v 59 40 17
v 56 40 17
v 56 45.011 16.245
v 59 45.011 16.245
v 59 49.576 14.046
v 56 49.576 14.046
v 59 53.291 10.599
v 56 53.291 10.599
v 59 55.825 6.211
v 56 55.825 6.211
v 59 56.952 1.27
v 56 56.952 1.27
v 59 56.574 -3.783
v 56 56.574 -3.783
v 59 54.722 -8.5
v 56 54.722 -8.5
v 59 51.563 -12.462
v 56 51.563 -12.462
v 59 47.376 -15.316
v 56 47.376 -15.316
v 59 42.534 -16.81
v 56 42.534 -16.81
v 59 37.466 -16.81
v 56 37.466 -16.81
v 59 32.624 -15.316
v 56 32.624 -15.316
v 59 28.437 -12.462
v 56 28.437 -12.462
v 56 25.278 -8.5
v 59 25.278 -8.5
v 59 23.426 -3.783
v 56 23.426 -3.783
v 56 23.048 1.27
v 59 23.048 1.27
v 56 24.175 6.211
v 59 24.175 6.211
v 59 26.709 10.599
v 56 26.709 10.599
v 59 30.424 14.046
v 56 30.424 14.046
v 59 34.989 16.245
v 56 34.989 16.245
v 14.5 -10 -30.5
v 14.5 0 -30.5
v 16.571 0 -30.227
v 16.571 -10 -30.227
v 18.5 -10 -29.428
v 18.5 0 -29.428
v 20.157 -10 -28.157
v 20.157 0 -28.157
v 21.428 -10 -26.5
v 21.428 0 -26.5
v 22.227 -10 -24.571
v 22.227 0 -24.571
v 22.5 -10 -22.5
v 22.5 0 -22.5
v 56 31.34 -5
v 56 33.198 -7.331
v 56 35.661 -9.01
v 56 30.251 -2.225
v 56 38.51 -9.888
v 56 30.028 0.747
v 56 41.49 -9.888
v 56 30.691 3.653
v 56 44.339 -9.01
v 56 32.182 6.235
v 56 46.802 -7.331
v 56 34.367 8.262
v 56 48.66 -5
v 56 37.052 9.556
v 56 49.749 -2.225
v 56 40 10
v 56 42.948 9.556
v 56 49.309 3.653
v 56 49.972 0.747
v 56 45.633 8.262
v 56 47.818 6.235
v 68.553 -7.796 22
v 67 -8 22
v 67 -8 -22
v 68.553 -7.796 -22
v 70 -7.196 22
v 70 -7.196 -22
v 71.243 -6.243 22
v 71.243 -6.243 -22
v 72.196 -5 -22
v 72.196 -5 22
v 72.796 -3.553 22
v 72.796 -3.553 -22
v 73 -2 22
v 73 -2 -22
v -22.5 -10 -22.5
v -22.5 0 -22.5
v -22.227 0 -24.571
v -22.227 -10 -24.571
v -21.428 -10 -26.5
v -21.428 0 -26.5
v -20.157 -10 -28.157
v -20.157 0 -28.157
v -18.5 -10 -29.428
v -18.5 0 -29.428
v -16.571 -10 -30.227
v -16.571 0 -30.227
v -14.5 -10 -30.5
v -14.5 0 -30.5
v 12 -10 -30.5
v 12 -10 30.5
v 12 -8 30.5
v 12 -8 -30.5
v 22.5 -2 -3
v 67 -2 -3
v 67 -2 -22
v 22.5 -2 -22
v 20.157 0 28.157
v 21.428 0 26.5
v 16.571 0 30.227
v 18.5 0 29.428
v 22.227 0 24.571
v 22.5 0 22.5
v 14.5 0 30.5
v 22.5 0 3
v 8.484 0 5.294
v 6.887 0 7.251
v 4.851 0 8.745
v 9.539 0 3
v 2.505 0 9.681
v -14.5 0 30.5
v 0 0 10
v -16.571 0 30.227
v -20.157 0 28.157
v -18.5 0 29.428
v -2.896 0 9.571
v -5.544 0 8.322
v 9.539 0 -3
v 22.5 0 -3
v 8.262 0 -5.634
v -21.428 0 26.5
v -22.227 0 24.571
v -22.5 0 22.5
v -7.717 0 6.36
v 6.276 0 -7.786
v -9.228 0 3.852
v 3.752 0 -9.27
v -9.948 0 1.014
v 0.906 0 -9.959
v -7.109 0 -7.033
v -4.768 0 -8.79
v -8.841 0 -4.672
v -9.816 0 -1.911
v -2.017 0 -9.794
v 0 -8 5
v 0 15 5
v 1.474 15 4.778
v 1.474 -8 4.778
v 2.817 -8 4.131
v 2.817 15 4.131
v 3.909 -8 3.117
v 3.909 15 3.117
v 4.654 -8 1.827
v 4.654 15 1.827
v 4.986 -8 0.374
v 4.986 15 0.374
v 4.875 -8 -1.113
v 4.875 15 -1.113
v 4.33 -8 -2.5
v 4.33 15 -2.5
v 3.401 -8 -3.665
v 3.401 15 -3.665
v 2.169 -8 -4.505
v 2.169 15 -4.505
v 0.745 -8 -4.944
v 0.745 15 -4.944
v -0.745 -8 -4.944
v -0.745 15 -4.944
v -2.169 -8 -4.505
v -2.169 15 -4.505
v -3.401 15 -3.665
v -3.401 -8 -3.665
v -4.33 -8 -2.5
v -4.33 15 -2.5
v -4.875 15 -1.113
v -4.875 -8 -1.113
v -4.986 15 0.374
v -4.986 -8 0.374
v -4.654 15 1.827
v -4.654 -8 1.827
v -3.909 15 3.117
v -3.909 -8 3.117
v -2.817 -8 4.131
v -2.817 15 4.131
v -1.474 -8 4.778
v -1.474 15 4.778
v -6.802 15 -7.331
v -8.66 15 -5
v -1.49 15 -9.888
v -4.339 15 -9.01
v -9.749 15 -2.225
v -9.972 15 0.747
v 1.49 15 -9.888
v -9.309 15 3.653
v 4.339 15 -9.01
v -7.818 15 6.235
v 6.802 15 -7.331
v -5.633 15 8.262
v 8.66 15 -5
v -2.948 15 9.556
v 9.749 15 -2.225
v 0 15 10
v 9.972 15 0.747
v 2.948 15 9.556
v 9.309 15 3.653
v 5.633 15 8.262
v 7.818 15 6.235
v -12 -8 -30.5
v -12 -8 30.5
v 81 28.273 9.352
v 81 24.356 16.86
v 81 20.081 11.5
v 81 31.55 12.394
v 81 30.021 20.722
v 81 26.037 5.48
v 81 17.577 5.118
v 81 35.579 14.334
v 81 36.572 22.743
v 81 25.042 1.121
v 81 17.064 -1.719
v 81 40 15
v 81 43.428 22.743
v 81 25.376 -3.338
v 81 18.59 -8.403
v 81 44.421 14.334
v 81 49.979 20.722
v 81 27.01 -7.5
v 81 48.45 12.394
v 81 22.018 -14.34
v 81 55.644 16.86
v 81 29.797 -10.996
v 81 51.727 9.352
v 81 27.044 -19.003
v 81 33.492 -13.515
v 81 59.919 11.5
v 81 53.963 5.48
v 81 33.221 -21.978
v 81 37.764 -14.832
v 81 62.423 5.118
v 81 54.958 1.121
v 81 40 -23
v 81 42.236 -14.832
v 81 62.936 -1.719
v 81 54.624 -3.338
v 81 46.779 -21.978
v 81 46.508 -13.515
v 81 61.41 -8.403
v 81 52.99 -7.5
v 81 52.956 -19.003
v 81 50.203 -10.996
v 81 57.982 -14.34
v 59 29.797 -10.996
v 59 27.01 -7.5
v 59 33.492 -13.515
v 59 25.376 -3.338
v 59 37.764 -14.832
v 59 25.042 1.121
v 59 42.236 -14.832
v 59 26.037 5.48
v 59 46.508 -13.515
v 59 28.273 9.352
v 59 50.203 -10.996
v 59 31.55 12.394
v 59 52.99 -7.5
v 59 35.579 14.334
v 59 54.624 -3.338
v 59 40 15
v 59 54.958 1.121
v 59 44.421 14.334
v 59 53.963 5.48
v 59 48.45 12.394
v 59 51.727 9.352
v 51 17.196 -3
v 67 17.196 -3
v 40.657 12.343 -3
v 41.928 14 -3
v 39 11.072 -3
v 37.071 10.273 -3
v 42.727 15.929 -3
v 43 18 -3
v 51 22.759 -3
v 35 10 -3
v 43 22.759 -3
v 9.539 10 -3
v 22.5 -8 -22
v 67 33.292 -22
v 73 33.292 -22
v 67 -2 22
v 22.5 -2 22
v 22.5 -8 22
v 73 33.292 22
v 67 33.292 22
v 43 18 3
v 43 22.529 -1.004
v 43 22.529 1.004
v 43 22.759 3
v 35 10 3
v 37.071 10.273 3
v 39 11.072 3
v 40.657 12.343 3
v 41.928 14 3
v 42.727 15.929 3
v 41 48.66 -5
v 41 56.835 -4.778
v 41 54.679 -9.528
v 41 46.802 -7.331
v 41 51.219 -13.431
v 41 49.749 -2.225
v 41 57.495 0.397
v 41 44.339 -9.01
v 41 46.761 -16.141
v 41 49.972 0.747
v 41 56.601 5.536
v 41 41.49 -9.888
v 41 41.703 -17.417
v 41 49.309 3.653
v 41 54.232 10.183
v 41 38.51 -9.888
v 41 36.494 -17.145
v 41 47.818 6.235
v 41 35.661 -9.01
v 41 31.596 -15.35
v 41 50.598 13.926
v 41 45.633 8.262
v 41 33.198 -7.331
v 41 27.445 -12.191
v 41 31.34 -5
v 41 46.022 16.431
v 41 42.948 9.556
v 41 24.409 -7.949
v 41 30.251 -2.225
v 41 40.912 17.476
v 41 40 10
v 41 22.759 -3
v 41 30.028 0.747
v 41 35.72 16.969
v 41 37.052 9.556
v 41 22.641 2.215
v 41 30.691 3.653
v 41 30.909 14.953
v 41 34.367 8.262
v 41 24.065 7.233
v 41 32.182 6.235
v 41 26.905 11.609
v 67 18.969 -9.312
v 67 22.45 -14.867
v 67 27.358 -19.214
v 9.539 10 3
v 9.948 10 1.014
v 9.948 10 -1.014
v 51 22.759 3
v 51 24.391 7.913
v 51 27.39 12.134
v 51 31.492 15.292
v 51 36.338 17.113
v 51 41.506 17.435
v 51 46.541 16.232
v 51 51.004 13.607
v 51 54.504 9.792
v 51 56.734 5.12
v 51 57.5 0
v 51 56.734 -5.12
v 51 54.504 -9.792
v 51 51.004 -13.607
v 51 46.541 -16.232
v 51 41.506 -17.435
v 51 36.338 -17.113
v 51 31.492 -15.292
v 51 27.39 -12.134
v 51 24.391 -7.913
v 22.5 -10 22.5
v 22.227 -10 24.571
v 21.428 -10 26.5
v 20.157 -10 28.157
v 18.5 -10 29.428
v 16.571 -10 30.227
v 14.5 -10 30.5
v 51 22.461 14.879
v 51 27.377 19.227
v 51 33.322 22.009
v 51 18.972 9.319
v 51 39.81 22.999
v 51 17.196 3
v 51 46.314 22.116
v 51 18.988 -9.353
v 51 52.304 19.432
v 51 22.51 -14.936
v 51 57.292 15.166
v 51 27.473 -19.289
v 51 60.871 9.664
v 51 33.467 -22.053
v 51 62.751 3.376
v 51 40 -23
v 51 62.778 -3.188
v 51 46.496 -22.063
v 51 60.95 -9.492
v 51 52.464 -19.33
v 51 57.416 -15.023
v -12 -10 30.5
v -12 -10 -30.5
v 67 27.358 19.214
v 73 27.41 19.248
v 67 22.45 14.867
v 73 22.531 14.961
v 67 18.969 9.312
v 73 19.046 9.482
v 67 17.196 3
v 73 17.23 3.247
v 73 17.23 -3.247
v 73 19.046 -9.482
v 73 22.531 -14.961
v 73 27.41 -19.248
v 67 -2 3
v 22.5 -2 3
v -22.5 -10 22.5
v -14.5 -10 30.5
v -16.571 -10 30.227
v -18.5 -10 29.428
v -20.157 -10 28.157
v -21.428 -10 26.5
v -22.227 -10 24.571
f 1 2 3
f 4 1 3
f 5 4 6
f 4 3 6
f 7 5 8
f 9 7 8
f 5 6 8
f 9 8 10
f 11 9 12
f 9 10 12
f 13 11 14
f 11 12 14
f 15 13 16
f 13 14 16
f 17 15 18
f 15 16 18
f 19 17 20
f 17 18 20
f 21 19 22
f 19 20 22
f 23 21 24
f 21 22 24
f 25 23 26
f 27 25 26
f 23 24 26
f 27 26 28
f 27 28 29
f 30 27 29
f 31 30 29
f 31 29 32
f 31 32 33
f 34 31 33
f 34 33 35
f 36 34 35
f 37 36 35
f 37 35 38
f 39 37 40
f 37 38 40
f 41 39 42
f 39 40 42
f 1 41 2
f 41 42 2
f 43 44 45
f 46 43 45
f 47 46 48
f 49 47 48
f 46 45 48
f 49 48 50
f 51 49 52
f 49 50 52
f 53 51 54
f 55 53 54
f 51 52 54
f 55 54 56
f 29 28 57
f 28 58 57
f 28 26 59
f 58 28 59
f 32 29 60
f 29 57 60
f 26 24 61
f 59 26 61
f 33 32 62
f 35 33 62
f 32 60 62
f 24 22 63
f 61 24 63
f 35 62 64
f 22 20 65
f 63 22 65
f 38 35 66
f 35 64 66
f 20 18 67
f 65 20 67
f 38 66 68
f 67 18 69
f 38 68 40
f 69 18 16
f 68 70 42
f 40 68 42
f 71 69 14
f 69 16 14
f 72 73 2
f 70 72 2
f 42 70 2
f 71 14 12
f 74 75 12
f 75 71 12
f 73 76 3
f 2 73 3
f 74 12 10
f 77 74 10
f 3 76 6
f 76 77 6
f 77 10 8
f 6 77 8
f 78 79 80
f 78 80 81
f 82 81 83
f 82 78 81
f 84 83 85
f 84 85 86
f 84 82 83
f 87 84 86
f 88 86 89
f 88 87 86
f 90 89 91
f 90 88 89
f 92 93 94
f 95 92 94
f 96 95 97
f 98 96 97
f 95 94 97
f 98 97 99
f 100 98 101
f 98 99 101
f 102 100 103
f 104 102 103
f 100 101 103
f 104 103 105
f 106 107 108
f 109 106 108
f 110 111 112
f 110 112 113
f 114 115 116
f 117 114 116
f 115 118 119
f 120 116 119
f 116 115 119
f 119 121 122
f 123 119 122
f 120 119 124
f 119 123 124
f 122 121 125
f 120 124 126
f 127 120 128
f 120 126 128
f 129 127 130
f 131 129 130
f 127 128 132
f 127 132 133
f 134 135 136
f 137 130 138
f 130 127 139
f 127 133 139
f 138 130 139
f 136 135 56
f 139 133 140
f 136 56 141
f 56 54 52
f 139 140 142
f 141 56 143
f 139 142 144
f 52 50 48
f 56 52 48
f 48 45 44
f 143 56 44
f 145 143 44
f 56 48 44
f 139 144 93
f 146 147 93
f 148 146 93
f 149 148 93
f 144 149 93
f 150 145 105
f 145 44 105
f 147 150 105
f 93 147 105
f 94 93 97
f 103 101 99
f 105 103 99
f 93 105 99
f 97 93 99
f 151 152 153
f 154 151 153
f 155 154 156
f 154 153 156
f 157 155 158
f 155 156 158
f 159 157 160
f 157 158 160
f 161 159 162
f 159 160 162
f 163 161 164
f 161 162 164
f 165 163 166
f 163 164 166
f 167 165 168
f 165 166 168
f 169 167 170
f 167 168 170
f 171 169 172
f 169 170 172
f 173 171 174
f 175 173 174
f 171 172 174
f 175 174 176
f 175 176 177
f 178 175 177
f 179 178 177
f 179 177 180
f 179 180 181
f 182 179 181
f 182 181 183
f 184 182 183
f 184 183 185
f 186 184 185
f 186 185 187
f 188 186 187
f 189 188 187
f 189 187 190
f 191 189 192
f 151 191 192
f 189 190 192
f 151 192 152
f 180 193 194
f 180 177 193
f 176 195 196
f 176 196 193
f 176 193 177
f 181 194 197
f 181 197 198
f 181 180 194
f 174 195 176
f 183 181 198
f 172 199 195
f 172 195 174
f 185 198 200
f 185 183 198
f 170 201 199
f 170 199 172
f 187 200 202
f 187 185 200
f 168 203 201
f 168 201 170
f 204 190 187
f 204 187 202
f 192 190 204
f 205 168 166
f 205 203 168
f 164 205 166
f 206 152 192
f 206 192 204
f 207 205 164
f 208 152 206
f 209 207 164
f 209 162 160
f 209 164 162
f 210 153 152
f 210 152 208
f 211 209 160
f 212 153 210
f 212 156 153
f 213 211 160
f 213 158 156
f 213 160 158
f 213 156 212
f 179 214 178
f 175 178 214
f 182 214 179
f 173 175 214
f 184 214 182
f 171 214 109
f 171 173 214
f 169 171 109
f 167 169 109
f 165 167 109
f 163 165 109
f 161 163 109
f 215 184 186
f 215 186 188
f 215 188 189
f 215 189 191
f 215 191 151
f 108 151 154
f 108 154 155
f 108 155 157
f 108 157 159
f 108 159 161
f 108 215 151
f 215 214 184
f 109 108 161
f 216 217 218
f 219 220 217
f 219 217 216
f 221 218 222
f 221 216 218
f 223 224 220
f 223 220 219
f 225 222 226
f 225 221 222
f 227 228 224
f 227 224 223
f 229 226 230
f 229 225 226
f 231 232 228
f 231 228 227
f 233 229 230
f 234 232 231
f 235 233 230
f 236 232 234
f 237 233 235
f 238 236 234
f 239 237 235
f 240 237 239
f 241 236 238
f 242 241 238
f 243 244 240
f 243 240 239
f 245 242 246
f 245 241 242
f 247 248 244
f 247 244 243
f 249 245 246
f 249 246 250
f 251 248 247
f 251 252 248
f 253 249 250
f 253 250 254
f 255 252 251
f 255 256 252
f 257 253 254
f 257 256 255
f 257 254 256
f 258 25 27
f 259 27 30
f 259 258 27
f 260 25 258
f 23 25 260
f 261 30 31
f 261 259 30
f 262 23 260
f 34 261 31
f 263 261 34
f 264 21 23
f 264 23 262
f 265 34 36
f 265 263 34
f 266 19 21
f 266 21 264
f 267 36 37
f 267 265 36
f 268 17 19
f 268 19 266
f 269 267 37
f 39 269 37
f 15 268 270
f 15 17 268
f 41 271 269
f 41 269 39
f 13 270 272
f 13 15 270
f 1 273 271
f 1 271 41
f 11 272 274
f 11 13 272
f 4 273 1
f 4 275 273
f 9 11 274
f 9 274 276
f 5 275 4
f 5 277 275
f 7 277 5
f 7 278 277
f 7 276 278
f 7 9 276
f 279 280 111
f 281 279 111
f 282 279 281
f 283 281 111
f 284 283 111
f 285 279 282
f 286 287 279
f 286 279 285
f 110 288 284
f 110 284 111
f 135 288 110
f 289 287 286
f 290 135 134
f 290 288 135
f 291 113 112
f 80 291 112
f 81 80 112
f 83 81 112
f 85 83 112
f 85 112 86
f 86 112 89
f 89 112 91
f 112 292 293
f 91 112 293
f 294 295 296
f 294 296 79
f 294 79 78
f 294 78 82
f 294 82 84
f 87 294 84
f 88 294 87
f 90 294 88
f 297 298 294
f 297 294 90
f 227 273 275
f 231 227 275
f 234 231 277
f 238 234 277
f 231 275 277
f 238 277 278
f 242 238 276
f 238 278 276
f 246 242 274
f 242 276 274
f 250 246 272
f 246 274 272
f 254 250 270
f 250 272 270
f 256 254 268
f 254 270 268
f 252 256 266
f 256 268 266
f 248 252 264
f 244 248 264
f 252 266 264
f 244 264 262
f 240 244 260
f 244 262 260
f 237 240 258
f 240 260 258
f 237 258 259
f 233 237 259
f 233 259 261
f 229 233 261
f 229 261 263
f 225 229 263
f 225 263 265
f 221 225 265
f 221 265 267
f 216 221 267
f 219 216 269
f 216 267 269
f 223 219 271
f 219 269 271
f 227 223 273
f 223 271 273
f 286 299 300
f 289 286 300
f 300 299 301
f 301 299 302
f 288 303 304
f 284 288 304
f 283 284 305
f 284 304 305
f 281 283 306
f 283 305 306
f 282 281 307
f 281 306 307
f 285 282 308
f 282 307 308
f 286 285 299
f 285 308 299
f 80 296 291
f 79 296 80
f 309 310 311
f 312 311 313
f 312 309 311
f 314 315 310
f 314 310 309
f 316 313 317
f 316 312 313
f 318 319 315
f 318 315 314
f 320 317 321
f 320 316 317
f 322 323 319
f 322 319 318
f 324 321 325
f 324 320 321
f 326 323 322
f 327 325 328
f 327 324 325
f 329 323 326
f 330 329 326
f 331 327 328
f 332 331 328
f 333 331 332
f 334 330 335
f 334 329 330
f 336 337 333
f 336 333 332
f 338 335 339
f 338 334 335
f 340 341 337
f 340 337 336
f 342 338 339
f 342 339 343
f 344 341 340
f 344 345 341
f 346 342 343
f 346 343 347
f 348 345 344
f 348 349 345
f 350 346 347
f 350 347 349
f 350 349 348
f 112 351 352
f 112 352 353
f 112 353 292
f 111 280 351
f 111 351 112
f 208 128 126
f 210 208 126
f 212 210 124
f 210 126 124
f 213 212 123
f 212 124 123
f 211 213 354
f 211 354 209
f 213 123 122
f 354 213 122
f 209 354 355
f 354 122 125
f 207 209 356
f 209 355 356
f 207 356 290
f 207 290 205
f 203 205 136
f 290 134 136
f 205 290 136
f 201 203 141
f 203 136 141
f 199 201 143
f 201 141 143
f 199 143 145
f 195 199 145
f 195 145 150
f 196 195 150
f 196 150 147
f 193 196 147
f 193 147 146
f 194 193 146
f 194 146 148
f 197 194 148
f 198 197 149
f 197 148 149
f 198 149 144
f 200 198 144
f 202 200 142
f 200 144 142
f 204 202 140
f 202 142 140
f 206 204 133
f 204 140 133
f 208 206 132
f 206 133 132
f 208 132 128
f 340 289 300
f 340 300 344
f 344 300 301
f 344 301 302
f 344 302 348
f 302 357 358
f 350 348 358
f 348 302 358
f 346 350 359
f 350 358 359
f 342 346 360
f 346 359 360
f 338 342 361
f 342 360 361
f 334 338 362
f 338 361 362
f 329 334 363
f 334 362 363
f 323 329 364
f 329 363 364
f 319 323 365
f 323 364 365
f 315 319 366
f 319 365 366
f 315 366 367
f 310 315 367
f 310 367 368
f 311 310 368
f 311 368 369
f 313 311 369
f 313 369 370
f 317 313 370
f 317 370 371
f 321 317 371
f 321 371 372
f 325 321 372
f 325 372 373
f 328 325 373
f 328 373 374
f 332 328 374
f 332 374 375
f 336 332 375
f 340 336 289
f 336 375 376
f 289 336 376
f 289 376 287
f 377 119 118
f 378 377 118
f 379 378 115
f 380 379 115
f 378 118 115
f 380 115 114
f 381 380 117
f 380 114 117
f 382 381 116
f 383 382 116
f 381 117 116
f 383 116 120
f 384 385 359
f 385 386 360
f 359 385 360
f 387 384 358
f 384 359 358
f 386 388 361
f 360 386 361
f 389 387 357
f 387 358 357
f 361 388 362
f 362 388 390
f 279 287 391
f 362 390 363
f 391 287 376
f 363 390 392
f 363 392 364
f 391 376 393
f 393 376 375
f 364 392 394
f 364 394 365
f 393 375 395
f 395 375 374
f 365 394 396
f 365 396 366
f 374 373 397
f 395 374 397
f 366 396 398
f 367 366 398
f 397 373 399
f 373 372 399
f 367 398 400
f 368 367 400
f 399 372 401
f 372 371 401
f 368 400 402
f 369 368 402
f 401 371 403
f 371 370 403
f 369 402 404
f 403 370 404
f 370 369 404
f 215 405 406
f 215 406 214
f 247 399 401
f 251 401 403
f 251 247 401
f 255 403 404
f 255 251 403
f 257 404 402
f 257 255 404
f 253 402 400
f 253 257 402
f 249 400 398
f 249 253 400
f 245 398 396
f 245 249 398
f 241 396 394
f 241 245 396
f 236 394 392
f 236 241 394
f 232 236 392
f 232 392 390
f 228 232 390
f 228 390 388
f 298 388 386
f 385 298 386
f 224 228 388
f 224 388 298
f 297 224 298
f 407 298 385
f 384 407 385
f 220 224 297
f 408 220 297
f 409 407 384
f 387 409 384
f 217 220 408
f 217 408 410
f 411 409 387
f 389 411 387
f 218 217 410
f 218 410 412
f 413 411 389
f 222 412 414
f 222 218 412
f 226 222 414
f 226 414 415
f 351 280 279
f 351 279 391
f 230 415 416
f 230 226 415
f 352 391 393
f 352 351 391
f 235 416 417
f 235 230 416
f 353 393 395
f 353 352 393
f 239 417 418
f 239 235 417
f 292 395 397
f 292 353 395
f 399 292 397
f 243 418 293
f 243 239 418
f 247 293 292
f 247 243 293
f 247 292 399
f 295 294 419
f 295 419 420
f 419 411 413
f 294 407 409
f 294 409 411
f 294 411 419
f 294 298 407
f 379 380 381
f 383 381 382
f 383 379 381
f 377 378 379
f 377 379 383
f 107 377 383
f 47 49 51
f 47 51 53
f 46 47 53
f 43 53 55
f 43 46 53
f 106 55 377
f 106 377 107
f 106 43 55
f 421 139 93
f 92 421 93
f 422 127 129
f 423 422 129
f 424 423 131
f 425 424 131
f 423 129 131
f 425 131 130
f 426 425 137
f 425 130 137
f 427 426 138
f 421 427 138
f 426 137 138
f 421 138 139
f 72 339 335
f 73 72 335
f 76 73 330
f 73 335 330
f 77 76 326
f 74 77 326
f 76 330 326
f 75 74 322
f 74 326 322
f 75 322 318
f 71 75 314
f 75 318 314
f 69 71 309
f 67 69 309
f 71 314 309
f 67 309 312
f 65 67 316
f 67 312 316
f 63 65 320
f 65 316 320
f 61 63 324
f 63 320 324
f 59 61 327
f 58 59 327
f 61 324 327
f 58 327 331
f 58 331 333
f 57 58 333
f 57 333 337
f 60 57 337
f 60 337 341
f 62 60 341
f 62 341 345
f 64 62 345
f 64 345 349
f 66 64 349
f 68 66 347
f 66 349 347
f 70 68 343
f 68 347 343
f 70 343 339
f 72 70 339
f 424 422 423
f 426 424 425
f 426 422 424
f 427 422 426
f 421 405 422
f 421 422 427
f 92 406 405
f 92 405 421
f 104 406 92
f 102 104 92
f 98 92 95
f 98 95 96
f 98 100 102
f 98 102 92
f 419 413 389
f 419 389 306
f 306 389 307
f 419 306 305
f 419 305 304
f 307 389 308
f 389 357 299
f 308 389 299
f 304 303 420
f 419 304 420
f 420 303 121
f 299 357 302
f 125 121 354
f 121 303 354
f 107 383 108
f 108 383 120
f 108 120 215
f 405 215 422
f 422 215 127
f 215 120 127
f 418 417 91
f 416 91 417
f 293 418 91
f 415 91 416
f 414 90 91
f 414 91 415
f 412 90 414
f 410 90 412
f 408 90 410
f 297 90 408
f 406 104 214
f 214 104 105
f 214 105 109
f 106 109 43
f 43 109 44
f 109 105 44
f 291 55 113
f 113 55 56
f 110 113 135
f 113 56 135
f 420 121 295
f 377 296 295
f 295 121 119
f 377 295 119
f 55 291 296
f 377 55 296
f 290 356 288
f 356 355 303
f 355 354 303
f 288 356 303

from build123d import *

# Parameters (mm, degrees)
EXTRUDE_1_DEPTH     = 10
SKETCH_2_R          = 10
EXTRUDE_2_DEPTH     = 15
SKETCH_3_W          = 24
SKETCH_3_H          = 4
CUT_EXTRUDE_1_DEPTH = 61
SKETCH_4_R          = 5
CUT_EXTRUDE_2_DEPTH = 23
EXTRUDE_3_DEPTH     = 22
EXTRUDE_4_DEPTH     = 3
EXTRUDE_START       = 8
SKETCH_7_R          = 23
EXTRUDE_5_DEPTH     = 30
SKETCH_9_R          = 17.5
EXTRUDE_6_DEPTH     = 10
SKETCH_10_R         = 10
CUT_EXTRUDE_3_DEPTH = 15
SKETCH_12_R         = 17
CUT_EXTRUDE_4_DEPTH = 3
SKETCH_13_R         = 15
CUT_EXTRUDE_5_DEPTH = 22


with BuildPart() as part:
    # 草图1 → 凸台-拉伸1 (new body)
    with BuildSketch(Plane(origin=(0, 0, 0), x_dir=(1, 0, 0), z_dir=(0, 1, 0))):
        with BuildLine():
            Line((-14.5, 30.5), (14.5, 30.5))
            ThreePointArc((14.5, 30.5), (20.156854249, 28.156854249), (22.5, 22.5))
            Line((22.5, 22.5), (22.5, -22.5))
            ThreePointArc((22.5, -22.5), (20.156854249, -28.156854249), (14.5, -30.5))
            Line((14.5, -30.5), (-14.5, -30.5))
            ThreePointArc((-14.5, -30.5), (-20.156854249, -28.156854249), (-22.5, -22.5))
            Line((-22.5, -22.5), (-22.5, 22.5))
            ThreePointArc((-22.5, 22.5), (-20.156854249, 28.156854249), (-14.5, 30.5))
        make_face()
    extrude(amount=-EXTRUDE_1_DEPTH)

    # 草图2 → 凸台-拉伸2 (add)
    with BuildSketch(Plane(origin=(0, 0, 0), x_dir=(1, 0, 0), z_dir=(0, 1, 0))):
        with Locations(Location((0, 0, 0), (0, 0, 270))):
            Circle(SKETCH_2_R)
    extrude(amount=EXTRUDE_2_DEPTH)

    # 草图3 → 切除-拉伸1 (cut)
    with BuildSketch(Plane.XY.offset(30.5)):
        with Locations((0, -10)):
            Rectangle(SKETCH_3_W, SKETCH_3_H)
    extrude(amount=-CUT_EXTRUDE_1_DEPTH, mode=Mode.SUBTRACT)

    # 草图4 → 切除-拉伸2 (cut)
    with BuildSketch(Plane(origin=(0, 15, 0), x_dir=(1, 0, 0), z_dir=(0, 1, 0))):
        with Locations(Location((0, 0, 0), (0, 0, 270))):
            Circle(SKETCH_4_R)
    extrude(amount=-CUT_EXTRUDE_2_DEPTH, mode=Mode.SUBTRACT)

    # 草图6 → 凸台-拉伸3 (add, symmetric)
    with BuildSketch(Plane.XY):
        with BuildLine():
            Line((22.5, -8), (67, -8))
            ThreePointArc((67, -8), (71.242640687, -6.242640687), (73, -2))
            Line((73, -2), (73, 40))
            Line((73, 40), (67, 40))
            Line((67, 40), (67, -2))
            Line((67, -2), (22.5, -2))
            Line((22.5, -2), (22.5, -8))
        make_face()
    extrude(amount=EXTRUDE_3_DEPTH, both=True)

    # 草图6<3> → 凸台-拉伸4 (add, symmetric)
    with BuildSketch(Plane.XY):
        with BuildLine():
            ThreePointArc((35, 10), (40.656854249, 12.343145751), (43, 18))
            Line((43, 18), (43, 40))
            Line((43, 40), (67, 40))
            Line((67, 40), (67, -2))
            Line((67, -2), (22.5, -2))
            Line((22.5, -2), (6.5, -2))
            Line((6.5, -2), (6.5, 10))
            Line((6.5, 10), (35, 10))
        make_face()
    extrude(amount=EXTRUDE_4_DEPTH, both=True)

    # 草图7 → 凸台-拉伸5 (add)
    with BuildSketch(Plane(origin=(73, 0, 0), x_dir=(0, 0, -1), z_dir=(1, 0, 0)).offset(EXTRUDE_START)):
        with Locations((0, 40)):
            Circle(SKETCH_7_R)
    extrude(amount=-EXTRUDE_5_DEPTH)

    # 草图9 → 凸台-拉伸6 (add)
    with BuildSketch(Plane.ZY.offset(-51)):
        with Locations(Location((0, 40, 0), (0, 0, 260.129110394))):
            Circle(SKETCH_9_R)
    extrude(amount=EXTRUDE_6_DEPTH)

    # 草图10 → 切除-拉伸3 (cut)
    with BuildSketch(Plane.ZY.offset(-41)):
        with Locations((0, 40)):
            Circle(SKETCH_10_R)
    extrude(amount=-CUT_EXTRUDE_3_DEPTH, mode=Mode.SUBTRACT)

    # 草图12 → 切除-拉伸4 (cut)
    with BuildSketch(Plane.ZY.offset(-56)):
        with Locations((0, 40)):
            Circle(SKETCH_12_R)
    extrude(amount=-CUT_EXTRUDE_4_DEPTH, mode=Mode.SUBTRACT)

    # 草图13 → 切除-拉伸5 (cut)
    with BuildSketch(Plane.ZY.offset(-59)):
        with Locations((0, 40)):
            Circle(SKETCH_13_R)
    extrude(amount=-CUT_EXTRUDE_5_DEPTH, mode=Mode.SUBTRACT)


solid = part.part
